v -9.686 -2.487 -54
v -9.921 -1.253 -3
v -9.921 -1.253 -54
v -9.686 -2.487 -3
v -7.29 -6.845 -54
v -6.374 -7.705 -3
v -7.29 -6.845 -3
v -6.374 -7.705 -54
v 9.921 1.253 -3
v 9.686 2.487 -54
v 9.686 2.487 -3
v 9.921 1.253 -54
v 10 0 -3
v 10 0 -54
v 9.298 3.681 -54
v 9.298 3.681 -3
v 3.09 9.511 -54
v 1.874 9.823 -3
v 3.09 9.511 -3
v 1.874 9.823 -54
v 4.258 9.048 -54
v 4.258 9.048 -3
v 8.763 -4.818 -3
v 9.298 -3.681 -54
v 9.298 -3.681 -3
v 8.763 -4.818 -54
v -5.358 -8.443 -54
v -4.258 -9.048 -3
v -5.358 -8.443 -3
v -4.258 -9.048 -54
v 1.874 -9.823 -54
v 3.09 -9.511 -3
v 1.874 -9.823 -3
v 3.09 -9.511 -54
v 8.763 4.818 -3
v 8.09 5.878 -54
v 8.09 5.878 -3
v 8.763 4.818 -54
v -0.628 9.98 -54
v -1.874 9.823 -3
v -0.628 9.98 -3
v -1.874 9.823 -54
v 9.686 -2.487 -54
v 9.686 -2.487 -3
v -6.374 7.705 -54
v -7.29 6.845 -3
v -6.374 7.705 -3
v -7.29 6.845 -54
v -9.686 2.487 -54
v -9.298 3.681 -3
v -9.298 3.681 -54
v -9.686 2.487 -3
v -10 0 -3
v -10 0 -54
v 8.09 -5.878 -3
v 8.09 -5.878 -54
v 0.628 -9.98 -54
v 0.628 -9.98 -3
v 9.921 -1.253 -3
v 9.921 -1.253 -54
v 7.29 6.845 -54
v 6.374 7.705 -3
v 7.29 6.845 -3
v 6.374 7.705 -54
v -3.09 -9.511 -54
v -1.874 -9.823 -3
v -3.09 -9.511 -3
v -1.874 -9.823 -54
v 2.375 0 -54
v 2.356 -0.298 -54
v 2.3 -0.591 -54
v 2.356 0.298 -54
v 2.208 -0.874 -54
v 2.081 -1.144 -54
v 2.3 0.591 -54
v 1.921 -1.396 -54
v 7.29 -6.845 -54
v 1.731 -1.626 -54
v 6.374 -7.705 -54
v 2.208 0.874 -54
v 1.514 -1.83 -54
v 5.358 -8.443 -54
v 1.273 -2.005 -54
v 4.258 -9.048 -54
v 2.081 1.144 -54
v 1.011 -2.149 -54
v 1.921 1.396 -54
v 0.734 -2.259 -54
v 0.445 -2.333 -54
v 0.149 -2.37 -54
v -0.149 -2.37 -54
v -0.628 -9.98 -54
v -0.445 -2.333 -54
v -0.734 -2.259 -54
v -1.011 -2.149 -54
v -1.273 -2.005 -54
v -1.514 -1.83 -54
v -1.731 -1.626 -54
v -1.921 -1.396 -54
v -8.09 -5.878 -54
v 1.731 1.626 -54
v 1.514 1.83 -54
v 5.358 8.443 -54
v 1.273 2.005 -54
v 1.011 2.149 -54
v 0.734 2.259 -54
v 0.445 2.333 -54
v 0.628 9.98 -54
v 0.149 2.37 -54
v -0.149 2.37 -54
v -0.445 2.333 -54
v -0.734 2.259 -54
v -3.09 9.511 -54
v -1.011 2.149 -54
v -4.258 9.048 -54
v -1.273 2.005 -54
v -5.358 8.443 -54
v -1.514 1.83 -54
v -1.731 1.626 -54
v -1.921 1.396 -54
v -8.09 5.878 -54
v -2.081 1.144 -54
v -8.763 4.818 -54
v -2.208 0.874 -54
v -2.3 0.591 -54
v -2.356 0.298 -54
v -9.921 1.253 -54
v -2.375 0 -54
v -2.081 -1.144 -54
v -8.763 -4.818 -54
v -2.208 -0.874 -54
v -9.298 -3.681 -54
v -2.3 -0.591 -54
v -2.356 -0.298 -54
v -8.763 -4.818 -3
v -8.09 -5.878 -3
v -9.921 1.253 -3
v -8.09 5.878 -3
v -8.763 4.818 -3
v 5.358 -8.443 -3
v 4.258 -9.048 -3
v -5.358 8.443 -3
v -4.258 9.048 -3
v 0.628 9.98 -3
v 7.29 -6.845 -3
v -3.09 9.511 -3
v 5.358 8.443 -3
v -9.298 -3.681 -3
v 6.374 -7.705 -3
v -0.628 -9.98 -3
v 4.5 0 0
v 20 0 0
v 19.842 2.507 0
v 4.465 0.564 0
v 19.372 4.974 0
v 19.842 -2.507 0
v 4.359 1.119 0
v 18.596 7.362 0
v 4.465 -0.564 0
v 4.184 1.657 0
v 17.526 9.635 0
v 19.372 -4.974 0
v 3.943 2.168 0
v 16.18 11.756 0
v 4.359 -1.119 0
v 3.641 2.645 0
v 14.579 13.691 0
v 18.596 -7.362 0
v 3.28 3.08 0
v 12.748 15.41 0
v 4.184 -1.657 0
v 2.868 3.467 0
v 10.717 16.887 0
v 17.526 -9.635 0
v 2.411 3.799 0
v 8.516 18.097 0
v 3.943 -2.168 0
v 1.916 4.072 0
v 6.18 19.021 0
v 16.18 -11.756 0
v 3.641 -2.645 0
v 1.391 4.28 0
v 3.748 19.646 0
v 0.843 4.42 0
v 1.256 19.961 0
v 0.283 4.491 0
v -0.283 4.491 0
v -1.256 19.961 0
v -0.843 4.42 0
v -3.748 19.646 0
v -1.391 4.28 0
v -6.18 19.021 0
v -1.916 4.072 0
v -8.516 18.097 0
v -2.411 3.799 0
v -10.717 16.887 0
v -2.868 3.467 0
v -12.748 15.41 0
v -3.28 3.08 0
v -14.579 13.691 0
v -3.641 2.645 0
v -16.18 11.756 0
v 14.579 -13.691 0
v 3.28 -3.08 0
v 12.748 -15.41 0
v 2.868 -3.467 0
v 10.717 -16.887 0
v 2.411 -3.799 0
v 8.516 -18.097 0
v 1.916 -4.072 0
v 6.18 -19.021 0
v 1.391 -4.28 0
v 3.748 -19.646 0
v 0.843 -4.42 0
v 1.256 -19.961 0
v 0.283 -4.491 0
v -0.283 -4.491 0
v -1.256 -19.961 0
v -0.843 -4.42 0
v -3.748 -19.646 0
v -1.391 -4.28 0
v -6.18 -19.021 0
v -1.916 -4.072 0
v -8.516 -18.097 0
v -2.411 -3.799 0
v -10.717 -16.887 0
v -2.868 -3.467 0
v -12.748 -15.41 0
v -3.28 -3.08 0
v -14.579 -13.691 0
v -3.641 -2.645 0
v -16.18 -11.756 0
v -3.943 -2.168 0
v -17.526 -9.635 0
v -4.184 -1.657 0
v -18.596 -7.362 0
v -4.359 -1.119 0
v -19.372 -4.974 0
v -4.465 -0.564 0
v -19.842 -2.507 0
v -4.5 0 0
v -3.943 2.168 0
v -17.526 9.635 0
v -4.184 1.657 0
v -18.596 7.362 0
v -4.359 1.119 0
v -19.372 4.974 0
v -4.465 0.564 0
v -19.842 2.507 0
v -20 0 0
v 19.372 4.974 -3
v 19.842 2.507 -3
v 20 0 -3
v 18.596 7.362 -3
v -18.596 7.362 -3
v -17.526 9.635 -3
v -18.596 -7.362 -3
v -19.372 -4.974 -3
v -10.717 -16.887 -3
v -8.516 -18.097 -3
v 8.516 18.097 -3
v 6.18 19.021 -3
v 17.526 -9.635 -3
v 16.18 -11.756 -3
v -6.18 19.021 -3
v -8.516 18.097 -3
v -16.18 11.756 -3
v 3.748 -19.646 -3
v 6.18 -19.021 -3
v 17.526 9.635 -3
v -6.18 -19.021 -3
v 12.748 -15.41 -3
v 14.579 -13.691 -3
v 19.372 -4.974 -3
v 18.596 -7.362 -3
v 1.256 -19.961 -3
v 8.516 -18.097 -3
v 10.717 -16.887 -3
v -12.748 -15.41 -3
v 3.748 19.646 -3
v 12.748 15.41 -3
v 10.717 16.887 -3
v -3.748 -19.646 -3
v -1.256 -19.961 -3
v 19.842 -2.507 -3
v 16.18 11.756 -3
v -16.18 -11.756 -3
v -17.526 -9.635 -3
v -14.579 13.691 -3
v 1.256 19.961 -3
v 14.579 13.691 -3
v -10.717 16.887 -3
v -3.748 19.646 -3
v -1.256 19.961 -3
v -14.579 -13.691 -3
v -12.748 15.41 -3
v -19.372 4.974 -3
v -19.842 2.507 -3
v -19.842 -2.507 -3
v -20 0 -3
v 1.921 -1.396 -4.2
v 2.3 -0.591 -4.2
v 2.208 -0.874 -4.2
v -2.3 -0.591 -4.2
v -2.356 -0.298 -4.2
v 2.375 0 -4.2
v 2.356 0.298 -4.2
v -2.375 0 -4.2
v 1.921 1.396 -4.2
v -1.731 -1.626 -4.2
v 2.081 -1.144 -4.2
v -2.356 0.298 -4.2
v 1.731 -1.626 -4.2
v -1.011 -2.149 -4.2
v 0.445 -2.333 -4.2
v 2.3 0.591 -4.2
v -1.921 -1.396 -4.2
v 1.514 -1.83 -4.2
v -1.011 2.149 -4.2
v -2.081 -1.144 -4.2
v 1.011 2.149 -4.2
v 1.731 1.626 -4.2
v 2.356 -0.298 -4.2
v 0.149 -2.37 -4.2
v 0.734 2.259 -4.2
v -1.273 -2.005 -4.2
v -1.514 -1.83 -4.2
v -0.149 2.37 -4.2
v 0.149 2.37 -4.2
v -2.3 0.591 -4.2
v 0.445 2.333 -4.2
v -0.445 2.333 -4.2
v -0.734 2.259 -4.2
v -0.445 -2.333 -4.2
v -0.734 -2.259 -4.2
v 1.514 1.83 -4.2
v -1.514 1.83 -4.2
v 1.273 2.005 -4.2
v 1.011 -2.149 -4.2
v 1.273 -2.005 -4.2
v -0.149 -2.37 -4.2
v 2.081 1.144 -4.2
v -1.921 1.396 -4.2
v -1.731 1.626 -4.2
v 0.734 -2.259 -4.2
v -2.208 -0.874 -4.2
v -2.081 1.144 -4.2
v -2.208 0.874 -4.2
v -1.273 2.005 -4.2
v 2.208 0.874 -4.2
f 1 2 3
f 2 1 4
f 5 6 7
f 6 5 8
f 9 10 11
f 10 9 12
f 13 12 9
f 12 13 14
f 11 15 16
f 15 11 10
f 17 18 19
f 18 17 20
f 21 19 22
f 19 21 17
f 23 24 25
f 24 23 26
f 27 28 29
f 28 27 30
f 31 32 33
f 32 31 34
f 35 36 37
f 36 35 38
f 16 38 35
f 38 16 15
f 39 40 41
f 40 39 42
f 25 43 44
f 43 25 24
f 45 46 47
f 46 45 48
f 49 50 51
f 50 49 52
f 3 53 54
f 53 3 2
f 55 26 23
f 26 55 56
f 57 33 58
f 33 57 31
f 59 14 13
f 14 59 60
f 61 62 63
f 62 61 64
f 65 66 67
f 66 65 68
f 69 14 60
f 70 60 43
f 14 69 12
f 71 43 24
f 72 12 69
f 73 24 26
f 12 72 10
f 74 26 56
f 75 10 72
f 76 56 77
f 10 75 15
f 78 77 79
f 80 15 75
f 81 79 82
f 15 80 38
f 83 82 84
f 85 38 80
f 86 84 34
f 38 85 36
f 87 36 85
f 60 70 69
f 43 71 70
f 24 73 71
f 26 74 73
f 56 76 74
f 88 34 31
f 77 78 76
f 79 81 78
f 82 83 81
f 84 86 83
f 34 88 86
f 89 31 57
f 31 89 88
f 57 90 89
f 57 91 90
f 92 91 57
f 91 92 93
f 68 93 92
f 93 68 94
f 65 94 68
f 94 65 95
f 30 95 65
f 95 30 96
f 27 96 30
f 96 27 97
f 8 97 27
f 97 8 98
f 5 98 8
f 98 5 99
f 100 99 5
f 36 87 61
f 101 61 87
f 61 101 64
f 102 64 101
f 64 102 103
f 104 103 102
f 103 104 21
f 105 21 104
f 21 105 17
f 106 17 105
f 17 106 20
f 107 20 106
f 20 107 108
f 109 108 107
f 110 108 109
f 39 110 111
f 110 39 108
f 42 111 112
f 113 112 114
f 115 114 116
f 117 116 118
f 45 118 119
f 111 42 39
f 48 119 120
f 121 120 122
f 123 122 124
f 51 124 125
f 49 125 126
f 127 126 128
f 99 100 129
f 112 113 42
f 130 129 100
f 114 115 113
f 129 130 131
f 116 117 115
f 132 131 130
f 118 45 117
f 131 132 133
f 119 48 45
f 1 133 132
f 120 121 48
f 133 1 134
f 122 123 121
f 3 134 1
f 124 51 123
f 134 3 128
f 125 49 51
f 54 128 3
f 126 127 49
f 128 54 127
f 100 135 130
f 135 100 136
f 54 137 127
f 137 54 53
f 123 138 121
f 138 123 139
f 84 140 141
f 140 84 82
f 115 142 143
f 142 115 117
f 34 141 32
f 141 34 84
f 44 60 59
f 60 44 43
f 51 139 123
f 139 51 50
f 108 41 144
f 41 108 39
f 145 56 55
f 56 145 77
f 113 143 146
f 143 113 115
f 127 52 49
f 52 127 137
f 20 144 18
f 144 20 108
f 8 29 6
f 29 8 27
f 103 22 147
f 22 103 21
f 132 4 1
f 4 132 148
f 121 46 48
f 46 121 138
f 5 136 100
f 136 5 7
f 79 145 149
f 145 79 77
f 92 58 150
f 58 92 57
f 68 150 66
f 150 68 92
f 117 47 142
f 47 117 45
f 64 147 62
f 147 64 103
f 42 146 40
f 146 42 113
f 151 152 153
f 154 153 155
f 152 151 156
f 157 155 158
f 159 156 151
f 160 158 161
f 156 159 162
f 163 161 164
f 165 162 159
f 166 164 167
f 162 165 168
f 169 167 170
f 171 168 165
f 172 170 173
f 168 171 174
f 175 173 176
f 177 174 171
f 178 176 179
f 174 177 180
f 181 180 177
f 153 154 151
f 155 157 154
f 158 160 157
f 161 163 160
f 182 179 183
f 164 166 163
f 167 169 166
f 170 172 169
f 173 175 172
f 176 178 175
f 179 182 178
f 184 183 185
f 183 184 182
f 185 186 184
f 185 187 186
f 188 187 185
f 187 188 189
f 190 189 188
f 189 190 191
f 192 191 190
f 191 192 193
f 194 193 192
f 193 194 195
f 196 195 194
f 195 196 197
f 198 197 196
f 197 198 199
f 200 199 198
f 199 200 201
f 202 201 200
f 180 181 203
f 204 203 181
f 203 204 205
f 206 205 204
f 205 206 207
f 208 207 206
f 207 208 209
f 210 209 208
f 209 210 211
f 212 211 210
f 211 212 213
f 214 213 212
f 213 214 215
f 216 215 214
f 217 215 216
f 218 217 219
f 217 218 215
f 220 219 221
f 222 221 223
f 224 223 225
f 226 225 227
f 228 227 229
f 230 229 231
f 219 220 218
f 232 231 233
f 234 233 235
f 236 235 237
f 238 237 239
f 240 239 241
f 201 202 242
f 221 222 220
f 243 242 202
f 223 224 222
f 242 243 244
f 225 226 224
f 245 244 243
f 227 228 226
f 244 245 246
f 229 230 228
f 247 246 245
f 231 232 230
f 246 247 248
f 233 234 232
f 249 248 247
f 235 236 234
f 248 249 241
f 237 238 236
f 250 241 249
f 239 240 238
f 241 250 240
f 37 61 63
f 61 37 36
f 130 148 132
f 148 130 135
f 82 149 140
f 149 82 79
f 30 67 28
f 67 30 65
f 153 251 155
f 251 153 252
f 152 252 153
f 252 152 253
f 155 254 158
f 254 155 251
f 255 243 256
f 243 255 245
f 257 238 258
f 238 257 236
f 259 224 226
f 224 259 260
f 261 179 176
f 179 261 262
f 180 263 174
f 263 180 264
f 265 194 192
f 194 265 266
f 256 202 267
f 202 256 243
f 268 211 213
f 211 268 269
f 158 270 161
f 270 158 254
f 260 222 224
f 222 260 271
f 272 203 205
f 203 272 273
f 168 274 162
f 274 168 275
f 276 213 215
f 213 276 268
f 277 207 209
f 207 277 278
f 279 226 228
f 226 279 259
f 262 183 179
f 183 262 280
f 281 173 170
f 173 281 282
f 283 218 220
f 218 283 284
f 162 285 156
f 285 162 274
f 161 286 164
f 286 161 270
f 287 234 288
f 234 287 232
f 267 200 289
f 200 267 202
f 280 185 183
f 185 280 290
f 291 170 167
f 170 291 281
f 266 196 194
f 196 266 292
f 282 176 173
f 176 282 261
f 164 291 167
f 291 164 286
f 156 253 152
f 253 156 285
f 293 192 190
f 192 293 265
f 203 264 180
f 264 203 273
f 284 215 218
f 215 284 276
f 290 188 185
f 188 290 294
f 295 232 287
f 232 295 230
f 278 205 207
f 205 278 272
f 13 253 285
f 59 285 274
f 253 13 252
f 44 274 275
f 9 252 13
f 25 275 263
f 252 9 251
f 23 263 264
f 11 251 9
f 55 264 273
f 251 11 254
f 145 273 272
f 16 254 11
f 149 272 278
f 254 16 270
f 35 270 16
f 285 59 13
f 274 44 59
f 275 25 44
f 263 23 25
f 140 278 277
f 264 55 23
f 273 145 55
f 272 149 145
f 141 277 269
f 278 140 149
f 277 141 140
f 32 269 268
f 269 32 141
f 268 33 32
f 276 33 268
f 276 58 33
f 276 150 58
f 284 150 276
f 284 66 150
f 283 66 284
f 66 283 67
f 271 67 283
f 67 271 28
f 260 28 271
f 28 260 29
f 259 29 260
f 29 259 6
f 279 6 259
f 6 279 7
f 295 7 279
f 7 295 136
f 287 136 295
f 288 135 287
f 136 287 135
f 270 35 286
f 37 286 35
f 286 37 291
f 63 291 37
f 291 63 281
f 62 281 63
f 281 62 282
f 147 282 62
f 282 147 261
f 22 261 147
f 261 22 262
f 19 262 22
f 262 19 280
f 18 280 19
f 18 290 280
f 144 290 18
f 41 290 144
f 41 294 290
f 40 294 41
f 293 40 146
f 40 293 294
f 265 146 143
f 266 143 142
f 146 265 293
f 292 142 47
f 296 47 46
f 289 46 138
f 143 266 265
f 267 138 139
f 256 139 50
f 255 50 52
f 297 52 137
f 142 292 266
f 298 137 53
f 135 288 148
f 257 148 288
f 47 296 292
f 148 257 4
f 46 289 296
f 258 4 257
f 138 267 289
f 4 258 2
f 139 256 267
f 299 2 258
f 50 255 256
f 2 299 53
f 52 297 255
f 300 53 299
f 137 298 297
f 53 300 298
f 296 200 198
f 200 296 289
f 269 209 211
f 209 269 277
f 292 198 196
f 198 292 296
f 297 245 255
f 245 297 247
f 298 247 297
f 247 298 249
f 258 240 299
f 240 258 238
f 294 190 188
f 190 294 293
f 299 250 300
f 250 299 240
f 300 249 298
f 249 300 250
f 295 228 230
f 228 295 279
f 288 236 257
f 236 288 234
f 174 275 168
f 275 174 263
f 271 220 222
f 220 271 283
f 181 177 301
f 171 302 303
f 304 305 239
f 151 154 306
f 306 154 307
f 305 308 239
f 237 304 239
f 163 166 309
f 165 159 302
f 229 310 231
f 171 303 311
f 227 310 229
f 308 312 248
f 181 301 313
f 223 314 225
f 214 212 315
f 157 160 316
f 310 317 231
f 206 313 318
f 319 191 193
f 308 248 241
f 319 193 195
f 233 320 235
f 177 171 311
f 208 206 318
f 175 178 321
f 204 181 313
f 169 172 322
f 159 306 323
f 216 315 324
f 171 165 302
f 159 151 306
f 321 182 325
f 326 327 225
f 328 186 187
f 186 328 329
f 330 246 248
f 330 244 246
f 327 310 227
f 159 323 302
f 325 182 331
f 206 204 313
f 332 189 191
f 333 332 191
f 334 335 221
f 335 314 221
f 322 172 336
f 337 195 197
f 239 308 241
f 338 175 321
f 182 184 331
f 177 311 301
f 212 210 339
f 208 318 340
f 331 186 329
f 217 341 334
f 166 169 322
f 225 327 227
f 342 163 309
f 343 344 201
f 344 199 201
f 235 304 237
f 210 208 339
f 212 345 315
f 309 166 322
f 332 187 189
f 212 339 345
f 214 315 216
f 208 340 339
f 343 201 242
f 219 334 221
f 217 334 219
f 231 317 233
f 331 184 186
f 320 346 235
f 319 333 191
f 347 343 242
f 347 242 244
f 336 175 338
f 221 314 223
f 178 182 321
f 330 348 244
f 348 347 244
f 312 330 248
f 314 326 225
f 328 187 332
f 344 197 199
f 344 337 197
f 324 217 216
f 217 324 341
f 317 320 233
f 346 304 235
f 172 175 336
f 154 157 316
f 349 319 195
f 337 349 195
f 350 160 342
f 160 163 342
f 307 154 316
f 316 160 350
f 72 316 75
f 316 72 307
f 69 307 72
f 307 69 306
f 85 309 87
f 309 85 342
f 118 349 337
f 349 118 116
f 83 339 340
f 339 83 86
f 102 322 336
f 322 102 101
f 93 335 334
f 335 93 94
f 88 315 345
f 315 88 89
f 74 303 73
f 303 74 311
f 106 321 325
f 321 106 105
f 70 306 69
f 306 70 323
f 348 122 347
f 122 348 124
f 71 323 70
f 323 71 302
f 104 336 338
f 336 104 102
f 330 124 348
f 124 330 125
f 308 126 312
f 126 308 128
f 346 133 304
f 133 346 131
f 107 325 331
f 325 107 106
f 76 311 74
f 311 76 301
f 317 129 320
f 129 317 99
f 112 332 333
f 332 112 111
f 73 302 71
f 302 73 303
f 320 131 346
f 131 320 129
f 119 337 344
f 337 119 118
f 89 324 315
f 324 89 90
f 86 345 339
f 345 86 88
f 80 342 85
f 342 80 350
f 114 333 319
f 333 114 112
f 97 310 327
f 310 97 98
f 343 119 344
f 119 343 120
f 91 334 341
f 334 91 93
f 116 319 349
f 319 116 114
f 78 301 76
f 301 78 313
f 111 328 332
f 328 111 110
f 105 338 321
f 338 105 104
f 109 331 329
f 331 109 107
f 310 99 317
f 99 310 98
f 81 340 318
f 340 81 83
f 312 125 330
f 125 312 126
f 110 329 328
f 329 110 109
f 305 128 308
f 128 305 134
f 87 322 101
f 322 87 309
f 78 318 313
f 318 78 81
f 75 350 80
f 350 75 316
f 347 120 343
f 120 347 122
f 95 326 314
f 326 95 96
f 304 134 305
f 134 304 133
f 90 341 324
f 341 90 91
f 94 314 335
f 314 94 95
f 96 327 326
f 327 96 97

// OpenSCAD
$fn = 50;


difference() {
	union() {
		translate(v = [0, 0, -54.0000000000]) {
			cylinder(h = 54, r = 10.0000000000);
		}
		translate(v = [0, 0, -3.0000000000]) {
			cylinder(h = 3, r = 20.0000000000);
		}
	}
	union() {
		translate(v = [0, 0, 0]) {
			rotate(a = [0, 0, 0]) {
				difference() {
					union() {
						#translate(v = [0, 0, -54.0000000000]) {
							cylinder(h = 54, r = 2.2500000000);
						}
						#translate(v = [0, 0, -4.2000000000]) {
							cylinder(h = 4.2000000000, r = 10.0000000000, r1 = 2.3750000000, r2 = 4.5000000000);
						}
						#translate(v = [0, 0, -54.0000000000]) {
							cylinder(h = 54, r = 2.3750000000);
						}
						#translate(v = [0, 0, -54.0000000000]) {
							cylinder(h = 54, r = 2.2500000000);
						}
					}
					union();
				}
			}
		}
	}
}
